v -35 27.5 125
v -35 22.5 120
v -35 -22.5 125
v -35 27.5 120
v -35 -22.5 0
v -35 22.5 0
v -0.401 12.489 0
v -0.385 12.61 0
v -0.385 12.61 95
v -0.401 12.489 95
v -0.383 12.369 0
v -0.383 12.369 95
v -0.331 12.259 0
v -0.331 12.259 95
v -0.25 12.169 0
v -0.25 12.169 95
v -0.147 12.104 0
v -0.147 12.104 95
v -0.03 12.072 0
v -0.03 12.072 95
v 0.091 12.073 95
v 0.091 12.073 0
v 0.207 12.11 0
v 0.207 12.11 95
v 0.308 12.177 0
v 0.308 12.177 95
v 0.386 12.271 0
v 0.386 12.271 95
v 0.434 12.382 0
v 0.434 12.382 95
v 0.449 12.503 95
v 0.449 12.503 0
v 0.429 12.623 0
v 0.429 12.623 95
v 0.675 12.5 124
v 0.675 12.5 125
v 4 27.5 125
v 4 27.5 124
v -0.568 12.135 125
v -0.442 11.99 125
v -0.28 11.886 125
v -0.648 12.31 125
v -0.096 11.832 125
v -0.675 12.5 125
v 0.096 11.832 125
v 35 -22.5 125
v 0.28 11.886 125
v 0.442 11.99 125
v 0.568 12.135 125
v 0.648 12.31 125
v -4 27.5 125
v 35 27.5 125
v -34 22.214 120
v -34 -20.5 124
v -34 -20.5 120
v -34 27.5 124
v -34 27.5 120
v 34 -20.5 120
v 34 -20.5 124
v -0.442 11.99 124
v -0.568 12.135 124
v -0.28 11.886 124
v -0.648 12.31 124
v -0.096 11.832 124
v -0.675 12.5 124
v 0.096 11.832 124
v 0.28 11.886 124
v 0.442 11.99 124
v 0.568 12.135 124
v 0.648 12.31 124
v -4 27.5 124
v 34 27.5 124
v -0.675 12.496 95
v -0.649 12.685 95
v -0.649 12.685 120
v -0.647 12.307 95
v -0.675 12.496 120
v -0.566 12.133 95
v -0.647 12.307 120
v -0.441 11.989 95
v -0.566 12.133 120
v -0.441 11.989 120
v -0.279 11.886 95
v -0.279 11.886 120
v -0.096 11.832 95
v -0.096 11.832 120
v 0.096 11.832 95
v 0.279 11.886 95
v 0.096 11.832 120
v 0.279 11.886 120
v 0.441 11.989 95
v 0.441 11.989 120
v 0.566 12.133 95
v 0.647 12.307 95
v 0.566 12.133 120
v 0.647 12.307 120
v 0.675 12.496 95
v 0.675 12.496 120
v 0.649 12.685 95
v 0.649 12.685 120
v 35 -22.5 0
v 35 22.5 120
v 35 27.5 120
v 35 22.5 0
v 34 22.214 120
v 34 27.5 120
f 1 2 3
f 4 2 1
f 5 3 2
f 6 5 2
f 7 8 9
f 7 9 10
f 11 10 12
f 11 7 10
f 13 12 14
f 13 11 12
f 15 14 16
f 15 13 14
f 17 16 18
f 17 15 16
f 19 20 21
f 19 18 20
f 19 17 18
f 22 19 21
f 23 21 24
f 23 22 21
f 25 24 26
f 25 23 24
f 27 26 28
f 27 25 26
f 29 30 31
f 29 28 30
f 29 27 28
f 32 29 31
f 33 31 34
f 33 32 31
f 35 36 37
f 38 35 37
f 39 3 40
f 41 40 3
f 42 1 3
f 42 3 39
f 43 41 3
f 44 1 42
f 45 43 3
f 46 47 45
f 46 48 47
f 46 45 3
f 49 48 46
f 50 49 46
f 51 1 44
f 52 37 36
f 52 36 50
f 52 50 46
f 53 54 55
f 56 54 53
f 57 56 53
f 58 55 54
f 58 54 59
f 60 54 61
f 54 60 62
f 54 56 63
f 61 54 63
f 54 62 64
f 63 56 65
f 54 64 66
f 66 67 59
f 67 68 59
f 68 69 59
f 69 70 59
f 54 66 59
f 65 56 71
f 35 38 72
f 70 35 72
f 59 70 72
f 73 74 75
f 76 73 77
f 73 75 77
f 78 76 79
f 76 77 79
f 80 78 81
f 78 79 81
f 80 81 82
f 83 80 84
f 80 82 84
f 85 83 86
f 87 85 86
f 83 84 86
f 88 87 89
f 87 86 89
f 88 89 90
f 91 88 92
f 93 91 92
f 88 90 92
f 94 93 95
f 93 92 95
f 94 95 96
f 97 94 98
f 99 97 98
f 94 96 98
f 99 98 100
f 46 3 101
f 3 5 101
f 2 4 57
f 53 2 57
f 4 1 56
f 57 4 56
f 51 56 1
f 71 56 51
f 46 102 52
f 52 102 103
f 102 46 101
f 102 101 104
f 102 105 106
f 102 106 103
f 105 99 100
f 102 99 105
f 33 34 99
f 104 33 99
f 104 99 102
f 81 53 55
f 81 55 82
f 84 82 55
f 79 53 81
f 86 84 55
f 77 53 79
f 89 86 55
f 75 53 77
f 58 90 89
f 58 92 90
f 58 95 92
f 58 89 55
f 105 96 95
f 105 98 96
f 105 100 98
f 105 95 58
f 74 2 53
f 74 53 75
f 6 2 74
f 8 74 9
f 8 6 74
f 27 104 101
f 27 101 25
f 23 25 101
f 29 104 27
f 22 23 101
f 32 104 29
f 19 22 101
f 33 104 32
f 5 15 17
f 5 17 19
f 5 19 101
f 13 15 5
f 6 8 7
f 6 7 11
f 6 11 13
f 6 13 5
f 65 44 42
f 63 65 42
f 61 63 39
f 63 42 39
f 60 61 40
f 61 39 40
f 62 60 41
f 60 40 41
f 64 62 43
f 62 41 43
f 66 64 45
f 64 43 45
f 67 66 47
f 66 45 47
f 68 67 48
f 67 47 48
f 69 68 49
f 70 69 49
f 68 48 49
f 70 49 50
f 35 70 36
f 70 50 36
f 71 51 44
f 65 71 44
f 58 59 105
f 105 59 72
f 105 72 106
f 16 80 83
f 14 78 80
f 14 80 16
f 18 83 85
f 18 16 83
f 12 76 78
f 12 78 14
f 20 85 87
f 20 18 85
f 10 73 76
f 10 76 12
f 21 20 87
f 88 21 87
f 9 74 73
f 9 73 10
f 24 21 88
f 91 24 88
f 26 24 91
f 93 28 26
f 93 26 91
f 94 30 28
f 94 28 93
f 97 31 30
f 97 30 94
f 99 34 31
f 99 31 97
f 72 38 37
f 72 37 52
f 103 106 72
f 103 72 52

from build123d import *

# Parameters (mm, degrees)
RESSALTO_EXTRUS_O2_DEPTH = 120
ESBO_O2_W                = 70
ESBO_O2_H                = 50
RESSALTO_EXTRUS_O3_DEPTH = 5
ESBO_O3_W                = 68
ESBO_O3_H                = 4
CORTE_EXTRUS_O1_DEPTH    = 48
ESBO_O5_R                = 0.4
CORTE_EXTRUS_O4_DEPTH    = 127
ESBO_O6_R                = 0.675
CORTE_EXTRUS_O6_DEPTH    = 30
CORTE_EXTRUS_O7_DEPTH    = 4


with BuildPart() as part:
    # Esboço1 → Ressalto-extrusão2 (new body)
    with BuildSketch(Plane.XY):
        with BuildLine():
            Line((35, -22.5), (-35, -22.5))
            Line((-35, -22.5), (-35, 22.5))
            Line((-35, 22.5), (-0.384609579, 12.609888451))
            ThreePointArc((-0.384609579, 12.609888451), (0.03064267, 12.068183293), (0.42886001, 12.622531431))
            Line((0.42886001, 12.622531431), (35, 22.5))
            Line((35, 22.5), (35, -22.5))
        make_face()
    extrude(amount=RESSALTO_EXTRUS_O2_DEPTH)

    # Esboço2 → Ressalto-extrusão3 (add)
    with BuildSketch(Plane.XY.offset(120)):
        with Locations((0, 2.5)):
            Rectangle(ESBO_O2_W, ESBO_O2_H)
    extrude(amount=RESSALTO_EXTRUS_O3_DEPTH)

    # Esboço3 → Corte-extrusão1 (cut)
    with BuildSketch(Plane(origin=(0, 27.5, 0), x_dir=(1, 0, 0), z_dir=(0, 1, 0))):
        with Locations((0, -122)):
            Rectangle(ESBO_O3_W, ESBO_O3_H)
    extrude(amount=-CORTE_EXTRUS_O1_DEPTH, mode=Mode.SUBTRACT)

    # Esboço5 → Corte-extrusão4 (cut)
    with BuildSketch(Plane(origin=(0, 0, 0), x_dir=(-1, 0, 0), z_dir=(0, 0, -1))):
        with Locations((0, 12.5)):
            Circle(ESBO_O5_R)
    extrude(amount=-CORTE_EXTRUS_O4_DEPTH, mode=Mode.SUBTRACT)

    # Esboço6 → Corte-extrusão6 (cut)
    with BuildSketch(Plane.XY.offset(125)):
        with Locations((0, 12.5)):
            Circle(ESBO_O6_R)
    extrude(amount=-CORTE_EXTRUS_O6_DEPTH, mode=Mode.SUBTRACT)

    # Esboço7 → Corte-extrusão7 (cut)
    with BuildSketch(Plane.XY.offset(125)):
        Polygon((0.675, 12.5), (4, 27.5), (0, 27.5), (-4, 27.5), (-0.675, 12.5), align=None)
    extrude(amount=-CORTE_EXTRUS_O7_DEPTH, mode=Mode.SUBTRACT)


solid = part.part
